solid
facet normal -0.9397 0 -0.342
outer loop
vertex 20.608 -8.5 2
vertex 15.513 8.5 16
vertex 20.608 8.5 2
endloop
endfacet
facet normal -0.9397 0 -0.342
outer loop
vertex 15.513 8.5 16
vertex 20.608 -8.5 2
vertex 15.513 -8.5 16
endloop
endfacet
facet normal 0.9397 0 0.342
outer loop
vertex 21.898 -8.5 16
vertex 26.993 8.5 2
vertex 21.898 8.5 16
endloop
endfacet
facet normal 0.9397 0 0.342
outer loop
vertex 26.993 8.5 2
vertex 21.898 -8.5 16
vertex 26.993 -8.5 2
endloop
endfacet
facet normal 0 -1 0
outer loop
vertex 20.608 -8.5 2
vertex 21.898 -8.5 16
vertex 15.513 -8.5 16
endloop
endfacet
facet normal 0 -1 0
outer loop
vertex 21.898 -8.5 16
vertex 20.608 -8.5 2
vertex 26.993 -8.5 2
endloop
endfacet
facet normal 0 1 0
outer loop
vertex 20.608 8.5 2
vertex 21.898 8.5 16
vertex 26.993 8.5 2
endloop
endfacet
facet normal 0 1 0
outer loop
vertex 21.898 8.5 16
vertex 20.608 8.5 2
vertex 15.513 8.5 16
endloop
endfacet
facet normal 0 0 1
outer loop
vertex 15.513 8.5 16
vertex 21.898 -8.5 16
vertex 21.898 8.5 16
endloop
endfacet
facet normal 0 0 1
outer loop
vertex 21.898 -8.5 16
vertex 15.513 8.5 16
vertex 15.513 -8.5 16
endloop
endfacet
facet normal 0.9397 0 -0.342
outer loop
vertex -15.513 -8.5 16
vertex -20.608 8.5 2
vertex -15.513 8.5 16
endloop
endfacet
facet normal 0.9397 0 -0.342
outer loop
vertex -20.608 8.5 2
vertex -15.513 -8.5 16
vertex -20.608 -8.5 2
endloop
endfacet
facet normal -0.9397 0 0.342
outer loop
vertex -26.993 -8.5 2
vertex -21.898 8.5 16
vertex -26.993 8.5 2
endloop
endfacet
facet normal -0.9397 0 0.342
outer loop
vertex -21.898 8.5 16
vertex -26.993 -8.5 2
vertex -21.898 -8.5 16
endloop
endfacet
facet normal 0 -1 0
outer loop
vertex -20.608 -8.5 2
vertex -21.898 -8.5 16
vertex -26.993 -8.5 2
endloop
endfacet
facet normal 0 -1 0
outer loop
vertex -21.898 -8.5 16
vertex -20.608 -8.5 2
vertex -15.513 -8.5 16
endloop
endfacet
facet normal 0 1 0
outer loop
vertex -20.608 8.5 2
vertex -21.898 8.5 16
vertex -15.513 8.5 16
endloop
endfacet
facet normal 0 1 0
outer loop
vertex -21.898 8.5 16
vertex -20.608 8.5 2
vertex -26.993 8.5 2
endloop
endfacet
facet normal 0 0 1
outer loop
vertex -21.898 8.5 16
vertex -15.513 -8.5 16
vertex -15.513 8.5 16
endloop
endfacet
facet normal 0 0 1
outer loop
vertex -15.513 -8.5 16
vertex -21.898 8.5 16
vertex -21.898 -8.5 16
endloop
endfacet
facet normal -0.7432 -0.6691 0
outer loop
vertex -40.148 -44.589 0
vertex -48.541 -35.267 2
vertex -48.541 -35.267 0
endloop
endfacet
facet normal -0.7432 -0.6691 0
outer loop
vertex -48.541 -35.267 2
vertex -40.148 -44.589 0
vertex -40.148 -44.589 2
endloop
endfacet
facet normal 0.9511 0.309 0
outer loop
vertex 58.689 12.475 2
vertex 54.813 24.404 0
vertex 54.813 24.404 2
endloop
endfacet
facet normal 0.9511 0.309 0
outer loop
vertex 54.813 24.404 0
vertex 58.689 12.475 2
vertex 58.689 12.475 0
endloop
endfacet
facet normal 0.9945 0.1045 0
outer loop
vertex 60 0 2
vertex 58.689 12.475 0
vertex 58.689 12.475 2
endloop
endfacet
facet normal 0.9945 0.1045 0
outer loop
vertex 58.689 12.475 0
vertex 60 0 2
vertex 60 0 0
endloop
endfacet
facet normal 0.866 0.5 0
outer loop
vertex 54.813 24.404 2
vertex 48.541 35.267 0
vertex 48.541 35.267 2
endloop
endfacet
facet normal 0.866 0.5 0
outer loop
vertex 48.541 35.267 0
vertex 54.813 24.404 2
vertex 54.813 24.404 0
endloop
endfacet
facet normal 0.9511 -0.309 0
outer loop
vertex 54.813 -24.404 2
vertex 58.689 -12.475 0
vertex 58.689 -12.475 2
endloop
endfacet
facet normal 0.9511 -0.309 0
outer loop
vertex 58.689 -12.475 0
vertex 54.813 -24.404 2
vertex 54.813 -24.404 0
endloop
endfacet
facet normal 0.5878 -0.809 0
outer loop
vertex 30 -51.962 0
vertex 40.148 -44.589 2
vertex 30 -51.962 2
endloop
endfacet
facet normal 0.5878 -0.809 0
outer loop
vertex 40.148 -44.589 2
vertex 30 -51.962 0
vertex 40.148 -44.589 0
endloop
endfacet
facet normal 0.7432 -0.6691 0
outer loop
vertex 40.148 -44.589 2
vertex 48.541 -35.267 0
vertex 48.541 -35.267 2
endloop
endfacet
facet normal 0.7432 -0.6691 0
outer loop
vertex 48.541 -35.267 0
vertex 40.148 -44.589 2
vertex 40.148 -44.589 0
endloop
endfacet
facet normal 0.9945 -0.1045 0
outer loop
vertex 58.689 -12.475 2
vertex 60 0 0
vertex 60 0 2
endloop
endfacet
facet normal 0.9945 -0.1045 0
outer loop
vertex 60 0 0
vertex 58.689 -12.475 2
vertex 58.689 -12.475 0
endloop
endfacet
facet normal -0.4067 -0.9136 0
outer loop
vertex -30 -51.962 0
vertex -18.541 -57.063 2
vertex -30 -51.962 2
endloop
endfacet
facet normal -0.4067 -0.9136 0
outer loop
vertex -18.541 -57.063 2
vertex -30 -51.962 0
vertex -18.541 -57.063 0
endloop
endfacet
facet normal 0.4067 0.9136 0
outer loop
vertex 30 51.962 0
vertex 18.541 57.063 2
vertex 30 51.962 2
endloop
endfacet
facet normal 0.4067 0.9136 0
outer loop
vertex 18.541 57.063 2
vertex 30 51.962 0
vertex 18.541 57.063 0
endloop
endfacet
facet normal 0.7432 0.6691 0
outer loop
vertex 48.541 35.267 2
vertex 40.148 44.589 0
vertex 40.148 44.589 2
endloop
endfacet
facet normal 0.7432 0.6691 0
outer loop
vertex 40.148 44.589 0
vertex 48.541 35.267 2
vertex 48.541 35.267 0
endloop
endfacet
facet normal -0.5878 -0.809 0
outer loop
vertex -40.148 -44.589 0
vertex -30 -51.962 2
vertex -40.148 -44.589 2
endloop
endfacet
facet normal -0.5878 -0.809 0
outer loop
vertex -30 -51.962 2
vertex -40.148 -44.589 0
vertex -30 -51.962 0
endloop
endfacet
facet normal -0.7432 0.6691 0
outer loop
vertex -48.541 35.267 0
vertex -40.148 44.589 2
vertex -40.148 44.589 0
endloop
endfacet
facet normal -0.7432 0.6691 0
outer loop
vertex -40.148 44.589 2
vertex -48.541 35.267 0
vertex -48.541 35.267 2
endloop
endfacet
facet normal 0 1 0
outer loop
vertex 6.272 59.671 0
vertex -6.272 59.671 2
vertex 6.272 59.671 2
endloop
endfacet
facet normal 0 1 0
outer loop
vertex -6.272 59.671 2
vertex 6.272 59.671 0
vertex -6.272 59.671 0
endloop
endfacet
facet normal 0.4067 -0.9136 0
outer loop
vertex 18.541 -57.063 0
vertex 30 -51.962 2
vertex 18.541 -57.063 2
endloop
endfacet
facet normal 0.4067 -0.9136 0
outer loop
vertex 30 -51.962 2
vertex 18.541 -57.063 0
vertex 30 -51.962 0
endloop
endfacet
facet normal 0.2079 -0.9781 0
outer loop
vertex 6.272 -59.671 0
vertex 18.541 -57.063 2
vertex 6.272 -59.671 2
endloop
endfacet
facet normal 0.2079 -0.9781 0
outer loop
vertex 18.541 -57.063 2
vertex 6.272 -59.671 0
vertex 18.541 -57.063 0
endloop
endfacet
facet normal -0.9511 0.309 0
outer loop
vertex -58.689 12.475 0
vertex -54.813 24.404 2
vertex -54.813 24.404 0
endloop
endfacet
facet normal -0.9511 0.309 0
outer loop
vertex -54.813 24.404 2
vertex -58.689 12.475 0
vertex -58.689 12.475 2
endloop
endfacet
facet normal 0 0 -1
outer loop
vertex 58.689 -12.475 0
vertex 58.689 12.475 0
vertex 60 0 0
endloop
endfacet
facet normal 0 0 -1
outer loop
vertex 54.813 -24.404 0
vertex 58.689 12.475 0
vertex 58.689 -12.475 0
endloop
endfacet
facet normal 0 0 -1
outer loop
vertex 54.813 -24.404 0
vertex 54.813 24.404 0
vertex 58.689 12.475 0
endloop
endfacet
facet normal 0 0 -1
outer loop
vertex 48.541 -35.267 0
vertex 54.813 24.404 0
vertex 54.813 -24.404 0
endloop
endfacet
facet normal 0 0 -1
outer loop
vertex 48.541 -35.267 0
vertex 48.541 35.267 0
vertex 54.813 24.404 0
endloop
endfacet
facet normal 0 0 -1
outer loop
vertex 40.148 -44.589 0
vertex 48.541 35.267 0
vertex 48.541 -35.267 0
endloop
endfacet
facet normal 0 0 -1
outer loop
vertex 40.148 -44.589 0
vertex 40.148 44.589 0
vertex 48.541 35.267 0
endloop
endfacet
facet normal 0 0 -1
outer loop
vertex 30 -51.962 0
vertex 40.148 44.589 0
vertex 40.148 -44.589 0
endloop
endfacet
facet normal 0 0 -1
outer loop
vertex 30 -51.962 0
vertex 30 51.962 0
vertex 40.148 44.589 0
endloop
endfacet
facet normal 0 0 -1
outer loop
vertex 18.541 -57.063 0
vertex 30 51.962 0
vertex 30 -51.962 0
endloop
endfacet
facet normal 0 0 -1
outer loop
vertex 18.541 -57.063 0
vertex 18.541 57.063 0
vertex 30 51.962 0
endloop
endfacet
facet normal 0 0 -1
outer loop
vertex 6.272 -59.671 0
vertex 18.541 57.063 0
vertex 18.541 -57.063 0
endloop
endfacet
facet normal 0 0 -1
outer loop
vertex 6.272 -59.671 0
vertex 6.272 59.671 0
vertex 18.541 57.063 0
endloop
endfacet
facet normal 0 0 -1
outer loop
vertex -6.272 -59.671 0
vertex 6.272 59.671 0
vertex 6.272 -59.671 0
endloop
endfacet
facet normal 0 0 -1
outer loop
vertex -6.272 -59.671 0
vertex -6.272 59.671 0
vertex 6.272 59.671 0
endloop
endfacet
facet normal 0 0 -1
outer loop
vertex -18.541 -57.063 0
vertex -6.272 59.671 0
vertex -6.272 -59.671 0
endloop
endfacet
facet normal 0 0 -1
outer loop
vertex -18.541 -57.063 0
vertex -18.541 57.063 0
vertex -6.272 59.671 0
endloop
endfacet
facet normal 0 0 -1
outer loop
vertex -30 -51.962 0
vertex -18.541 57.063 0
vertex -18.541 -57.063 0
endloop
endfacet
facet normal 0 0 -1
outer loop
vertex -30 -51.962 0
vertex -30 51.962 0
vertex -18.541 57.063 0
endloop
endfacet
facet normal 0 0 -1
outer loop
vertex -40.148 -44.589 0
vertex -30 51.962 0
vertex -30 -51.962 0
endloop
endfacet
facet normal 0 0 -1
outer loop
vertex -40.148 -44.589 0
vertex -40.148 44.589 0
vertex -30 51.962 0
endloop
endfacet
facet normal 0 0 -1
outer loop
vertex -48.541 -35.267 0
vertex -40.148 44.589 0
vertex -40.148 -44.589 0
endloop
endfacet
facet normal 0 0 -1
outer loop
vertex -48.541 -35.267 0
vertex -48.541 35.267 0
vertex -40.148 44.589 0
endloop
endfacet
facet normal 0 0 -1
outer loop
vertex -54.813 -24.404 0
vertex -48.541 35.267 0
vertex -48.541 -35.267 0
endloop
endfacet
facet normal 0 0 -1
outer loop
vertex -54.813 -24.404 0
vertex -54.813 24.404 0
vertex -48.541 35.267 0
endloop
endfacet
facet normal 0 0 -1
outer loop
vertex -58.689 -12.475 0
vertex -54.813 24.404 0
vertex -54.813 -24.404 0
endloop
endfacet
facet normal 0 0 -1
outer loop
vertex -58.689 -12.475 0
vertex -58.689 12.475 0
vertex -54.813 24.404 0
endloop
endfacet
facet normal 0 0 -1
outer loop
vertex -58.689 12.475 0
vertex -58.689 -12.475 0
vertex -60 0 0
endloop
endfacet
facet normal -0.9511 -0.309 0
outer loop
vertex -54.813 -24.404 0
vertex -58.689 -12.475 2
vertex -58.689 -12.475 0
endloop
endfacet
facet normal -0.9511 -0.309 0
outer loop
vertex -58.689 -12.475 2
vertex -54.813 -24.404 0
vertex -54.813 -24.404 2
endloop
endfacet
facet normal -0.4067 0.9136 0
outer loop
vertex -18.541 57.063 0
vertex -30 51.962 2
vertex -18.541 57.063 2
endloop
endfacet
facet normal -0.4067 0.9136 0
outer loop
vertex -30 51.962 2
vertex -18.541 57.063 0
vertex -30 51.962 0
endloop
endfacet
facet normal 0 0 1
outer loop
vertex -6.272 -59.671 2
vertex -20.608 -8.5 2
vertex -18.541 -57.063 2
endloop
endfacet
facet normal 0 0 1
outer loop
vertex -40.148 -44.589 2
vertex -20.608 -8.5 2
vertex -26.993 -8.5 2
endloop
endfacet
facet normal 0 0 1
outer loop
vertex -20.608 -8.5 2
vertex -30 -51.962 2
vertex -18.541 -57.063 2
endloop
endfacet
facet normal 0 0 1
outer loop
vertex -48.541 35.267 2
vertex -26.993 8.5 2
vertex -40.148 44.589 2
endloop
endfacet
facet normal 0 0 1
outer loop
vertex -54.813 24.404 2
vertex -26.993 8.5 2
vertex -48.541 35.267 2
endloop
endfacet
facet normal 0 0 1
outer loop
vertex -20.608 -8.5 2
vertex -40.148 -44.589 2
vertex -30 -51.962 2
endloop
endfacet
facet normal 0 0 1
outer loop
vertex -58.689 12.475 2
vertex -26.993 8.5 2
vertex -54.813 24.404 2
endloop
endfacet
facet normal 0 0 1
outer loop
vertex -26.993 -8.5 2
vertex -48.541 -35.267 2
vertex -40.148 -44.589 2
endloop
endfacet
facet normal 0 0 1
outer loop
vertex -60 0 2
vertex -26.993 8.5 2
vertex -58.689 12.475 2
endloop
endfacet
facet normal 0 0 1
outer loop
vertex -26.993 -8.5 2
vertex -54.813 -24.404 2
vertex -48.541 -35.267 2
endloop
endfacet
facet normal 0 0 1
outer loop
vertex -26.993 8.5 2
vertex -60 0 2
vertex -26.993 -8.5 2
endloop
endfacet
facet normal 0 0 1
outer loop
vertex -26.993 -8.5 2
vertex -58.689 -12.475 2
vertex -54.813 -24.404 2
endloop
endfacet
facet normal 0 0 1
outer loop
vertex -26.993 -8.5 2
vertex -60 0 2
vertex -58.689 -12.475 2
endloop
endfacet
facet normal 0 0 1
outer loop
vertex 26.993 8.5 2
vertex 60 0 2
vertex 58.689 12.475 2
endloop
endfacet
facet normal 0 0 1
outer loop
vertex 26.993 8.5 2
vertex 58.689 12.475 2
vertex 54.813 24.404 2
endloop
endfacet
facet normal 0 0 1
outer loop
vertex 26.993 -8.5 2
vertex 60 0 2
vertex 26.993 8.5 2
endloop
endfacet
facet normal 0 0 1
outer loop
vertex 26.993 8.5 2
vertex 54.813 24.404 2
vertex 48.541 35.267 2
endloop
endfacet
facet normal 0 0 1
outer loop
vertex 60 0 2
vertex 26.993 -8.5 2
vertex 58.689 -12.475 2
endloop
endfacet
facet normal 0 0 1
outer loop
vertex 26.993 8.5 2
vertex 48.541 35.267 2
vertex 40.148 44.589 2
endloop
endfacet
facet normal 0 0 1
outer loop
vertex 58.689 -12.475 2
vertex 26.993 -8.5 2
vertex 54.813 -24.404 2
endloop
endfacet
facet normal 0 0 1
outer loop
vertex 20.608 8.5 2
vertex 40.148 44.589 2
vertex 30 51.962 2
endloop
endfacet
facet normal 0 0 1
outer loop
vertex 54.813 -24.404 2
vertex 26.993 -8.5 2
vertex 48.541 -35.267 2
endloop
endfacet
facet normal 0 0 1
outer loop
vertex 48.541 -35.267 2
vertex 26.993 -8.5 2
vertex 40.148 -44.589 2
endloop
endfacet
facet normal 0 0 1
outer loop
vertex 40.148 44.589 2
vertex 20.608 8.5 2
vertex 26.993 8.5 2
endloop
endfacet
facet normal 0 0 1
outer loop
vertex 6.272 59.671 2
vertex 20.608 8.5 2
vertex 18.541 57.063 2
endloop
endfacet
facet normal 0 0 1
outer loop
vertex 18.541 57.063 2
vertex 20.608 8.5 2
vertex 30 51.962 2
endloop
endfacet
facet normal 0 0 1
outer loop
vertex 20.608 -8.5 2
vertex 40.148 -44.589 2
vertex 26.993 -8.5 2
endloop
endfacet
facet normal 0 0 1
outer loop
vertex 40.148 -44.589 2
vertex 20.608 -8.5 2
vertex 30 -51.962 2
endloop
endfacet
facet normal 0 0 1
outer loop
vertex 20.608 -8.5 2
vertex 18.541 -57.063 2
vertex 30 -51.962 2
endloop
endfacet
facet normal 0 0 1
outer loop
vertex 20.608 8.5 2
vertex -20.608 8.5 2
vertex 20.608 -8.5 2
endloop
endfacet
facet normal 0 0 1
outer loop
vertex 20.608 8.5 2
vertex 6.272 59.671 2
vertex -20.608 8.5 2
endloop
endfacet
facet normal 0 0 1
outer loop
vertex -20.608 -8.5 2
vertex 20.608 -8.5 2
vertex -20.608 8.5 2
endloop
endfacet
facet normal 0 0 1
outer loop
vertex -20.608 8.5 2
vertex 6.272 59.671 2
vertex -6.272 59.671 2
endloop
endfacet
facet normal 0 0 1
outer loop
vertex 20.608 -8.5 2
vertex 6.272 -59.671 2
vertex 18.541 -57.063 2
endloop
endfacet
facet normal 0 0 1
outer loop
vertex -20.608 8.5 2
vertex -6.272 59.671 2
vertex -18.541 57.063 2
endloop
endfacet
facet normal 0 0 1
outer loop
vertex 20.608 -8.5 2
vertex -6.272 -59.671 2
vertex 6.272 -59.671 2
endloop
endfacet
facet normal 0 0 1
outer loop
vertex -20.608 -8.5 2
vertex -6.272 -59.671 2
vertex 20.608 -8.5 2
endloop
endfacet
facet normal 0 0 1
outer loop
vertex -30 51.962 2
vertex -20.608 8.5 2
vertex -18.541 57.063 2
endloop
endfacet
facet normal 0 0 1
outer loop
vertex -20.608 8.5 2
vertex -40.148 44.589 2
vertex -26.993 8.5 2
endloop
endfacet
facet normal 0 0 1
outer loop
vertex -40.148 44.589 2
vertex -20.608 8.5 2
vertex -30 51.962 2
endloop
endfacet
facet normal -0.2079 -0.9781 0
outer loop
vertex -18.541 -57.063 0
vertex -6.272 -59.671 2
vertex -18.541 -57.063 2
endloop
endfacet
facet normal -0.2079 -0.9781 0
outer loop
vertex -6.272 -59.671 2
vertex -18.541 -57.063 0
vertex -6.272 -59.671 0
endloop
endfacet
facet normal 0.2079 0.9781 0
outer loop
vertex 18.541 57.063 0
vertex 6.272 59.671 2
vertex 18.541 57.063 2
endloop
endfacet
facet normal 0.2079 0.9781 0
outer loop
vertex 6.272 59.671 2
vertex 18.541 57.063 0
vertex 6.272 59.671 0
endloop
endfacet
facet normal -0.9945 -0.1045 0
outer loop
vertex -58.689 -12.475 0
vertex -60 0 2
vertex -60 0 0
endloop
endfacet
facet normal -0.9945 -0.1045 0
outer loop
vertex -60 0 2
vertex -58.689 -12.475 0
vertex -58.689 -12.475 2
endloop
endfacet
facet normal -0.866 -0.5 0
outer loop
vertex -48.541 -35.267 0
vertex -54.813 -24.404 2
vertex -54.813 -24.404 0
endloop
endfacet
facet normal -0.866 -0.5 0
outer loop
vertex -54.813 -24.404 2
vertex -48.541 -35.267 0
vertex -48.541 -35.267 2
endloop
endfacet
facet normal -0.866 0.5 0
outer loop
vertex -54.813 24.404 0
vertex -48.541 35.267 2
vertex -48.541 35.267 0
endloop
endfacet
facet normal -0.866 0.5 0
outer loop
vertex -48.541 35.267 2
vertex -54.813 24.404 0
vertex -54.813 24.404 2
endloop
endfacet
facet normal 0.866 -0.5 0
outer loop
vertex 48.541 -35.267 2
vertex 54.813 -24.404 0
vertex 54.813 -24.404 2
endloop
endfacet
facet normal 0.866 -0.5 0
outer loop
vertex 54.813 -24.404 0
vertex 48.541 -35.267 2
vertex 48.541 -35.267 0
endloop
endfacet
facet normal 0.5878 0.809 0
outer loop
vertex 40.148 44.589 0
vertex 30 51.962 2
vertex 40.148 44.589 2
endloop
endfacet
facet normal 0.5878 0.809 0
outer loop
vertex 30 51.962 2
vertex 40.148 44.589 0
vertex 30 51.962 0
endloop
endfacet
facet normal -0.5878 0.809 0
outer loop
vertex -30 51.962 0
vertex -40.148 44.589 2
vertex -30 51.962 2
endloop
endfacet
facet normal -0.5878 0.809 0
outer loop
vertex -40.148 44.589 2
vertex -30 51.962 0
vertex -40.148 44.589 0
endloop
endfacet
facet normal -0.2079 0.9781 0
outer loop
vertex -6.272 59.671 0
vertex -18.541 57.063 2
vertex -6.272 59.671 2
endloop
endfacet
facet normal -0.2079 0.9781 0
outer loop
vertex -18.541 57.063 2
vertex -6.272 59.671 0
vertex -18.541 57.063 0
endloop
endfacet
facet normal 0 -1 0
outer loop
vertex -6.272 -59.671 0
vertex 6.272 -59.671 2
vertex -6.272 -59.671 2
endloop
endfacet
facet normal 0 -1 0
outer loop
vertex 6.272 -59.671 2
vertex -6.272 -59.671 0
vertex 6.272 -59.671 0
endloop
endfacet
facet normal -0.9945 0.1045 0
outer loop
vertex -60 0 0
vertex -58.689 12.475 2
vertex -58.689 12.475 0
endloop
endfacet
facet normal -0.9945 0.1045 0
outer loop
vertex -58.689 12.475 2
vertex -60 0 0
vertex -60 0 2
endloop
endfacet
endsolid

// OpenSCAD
module traba(){
	difference(){
		translate ([6.2,0,-3])rotate([0,-20,0])cube([6,17,20]);	
		translate ([-5,-2,14]) cube([20,20,20]);
		translate ([-5,-2,-21]) cube([20,20,20]);
	}
}

cylinder(h = 2, r1 = 60, r2 = 60, center = false);
translate([0,-17/2,2]){
translate ([31/2,0,0]) traba();
translate ([-31/2,0,0]) mirror([1,0,0]) traba();
}
